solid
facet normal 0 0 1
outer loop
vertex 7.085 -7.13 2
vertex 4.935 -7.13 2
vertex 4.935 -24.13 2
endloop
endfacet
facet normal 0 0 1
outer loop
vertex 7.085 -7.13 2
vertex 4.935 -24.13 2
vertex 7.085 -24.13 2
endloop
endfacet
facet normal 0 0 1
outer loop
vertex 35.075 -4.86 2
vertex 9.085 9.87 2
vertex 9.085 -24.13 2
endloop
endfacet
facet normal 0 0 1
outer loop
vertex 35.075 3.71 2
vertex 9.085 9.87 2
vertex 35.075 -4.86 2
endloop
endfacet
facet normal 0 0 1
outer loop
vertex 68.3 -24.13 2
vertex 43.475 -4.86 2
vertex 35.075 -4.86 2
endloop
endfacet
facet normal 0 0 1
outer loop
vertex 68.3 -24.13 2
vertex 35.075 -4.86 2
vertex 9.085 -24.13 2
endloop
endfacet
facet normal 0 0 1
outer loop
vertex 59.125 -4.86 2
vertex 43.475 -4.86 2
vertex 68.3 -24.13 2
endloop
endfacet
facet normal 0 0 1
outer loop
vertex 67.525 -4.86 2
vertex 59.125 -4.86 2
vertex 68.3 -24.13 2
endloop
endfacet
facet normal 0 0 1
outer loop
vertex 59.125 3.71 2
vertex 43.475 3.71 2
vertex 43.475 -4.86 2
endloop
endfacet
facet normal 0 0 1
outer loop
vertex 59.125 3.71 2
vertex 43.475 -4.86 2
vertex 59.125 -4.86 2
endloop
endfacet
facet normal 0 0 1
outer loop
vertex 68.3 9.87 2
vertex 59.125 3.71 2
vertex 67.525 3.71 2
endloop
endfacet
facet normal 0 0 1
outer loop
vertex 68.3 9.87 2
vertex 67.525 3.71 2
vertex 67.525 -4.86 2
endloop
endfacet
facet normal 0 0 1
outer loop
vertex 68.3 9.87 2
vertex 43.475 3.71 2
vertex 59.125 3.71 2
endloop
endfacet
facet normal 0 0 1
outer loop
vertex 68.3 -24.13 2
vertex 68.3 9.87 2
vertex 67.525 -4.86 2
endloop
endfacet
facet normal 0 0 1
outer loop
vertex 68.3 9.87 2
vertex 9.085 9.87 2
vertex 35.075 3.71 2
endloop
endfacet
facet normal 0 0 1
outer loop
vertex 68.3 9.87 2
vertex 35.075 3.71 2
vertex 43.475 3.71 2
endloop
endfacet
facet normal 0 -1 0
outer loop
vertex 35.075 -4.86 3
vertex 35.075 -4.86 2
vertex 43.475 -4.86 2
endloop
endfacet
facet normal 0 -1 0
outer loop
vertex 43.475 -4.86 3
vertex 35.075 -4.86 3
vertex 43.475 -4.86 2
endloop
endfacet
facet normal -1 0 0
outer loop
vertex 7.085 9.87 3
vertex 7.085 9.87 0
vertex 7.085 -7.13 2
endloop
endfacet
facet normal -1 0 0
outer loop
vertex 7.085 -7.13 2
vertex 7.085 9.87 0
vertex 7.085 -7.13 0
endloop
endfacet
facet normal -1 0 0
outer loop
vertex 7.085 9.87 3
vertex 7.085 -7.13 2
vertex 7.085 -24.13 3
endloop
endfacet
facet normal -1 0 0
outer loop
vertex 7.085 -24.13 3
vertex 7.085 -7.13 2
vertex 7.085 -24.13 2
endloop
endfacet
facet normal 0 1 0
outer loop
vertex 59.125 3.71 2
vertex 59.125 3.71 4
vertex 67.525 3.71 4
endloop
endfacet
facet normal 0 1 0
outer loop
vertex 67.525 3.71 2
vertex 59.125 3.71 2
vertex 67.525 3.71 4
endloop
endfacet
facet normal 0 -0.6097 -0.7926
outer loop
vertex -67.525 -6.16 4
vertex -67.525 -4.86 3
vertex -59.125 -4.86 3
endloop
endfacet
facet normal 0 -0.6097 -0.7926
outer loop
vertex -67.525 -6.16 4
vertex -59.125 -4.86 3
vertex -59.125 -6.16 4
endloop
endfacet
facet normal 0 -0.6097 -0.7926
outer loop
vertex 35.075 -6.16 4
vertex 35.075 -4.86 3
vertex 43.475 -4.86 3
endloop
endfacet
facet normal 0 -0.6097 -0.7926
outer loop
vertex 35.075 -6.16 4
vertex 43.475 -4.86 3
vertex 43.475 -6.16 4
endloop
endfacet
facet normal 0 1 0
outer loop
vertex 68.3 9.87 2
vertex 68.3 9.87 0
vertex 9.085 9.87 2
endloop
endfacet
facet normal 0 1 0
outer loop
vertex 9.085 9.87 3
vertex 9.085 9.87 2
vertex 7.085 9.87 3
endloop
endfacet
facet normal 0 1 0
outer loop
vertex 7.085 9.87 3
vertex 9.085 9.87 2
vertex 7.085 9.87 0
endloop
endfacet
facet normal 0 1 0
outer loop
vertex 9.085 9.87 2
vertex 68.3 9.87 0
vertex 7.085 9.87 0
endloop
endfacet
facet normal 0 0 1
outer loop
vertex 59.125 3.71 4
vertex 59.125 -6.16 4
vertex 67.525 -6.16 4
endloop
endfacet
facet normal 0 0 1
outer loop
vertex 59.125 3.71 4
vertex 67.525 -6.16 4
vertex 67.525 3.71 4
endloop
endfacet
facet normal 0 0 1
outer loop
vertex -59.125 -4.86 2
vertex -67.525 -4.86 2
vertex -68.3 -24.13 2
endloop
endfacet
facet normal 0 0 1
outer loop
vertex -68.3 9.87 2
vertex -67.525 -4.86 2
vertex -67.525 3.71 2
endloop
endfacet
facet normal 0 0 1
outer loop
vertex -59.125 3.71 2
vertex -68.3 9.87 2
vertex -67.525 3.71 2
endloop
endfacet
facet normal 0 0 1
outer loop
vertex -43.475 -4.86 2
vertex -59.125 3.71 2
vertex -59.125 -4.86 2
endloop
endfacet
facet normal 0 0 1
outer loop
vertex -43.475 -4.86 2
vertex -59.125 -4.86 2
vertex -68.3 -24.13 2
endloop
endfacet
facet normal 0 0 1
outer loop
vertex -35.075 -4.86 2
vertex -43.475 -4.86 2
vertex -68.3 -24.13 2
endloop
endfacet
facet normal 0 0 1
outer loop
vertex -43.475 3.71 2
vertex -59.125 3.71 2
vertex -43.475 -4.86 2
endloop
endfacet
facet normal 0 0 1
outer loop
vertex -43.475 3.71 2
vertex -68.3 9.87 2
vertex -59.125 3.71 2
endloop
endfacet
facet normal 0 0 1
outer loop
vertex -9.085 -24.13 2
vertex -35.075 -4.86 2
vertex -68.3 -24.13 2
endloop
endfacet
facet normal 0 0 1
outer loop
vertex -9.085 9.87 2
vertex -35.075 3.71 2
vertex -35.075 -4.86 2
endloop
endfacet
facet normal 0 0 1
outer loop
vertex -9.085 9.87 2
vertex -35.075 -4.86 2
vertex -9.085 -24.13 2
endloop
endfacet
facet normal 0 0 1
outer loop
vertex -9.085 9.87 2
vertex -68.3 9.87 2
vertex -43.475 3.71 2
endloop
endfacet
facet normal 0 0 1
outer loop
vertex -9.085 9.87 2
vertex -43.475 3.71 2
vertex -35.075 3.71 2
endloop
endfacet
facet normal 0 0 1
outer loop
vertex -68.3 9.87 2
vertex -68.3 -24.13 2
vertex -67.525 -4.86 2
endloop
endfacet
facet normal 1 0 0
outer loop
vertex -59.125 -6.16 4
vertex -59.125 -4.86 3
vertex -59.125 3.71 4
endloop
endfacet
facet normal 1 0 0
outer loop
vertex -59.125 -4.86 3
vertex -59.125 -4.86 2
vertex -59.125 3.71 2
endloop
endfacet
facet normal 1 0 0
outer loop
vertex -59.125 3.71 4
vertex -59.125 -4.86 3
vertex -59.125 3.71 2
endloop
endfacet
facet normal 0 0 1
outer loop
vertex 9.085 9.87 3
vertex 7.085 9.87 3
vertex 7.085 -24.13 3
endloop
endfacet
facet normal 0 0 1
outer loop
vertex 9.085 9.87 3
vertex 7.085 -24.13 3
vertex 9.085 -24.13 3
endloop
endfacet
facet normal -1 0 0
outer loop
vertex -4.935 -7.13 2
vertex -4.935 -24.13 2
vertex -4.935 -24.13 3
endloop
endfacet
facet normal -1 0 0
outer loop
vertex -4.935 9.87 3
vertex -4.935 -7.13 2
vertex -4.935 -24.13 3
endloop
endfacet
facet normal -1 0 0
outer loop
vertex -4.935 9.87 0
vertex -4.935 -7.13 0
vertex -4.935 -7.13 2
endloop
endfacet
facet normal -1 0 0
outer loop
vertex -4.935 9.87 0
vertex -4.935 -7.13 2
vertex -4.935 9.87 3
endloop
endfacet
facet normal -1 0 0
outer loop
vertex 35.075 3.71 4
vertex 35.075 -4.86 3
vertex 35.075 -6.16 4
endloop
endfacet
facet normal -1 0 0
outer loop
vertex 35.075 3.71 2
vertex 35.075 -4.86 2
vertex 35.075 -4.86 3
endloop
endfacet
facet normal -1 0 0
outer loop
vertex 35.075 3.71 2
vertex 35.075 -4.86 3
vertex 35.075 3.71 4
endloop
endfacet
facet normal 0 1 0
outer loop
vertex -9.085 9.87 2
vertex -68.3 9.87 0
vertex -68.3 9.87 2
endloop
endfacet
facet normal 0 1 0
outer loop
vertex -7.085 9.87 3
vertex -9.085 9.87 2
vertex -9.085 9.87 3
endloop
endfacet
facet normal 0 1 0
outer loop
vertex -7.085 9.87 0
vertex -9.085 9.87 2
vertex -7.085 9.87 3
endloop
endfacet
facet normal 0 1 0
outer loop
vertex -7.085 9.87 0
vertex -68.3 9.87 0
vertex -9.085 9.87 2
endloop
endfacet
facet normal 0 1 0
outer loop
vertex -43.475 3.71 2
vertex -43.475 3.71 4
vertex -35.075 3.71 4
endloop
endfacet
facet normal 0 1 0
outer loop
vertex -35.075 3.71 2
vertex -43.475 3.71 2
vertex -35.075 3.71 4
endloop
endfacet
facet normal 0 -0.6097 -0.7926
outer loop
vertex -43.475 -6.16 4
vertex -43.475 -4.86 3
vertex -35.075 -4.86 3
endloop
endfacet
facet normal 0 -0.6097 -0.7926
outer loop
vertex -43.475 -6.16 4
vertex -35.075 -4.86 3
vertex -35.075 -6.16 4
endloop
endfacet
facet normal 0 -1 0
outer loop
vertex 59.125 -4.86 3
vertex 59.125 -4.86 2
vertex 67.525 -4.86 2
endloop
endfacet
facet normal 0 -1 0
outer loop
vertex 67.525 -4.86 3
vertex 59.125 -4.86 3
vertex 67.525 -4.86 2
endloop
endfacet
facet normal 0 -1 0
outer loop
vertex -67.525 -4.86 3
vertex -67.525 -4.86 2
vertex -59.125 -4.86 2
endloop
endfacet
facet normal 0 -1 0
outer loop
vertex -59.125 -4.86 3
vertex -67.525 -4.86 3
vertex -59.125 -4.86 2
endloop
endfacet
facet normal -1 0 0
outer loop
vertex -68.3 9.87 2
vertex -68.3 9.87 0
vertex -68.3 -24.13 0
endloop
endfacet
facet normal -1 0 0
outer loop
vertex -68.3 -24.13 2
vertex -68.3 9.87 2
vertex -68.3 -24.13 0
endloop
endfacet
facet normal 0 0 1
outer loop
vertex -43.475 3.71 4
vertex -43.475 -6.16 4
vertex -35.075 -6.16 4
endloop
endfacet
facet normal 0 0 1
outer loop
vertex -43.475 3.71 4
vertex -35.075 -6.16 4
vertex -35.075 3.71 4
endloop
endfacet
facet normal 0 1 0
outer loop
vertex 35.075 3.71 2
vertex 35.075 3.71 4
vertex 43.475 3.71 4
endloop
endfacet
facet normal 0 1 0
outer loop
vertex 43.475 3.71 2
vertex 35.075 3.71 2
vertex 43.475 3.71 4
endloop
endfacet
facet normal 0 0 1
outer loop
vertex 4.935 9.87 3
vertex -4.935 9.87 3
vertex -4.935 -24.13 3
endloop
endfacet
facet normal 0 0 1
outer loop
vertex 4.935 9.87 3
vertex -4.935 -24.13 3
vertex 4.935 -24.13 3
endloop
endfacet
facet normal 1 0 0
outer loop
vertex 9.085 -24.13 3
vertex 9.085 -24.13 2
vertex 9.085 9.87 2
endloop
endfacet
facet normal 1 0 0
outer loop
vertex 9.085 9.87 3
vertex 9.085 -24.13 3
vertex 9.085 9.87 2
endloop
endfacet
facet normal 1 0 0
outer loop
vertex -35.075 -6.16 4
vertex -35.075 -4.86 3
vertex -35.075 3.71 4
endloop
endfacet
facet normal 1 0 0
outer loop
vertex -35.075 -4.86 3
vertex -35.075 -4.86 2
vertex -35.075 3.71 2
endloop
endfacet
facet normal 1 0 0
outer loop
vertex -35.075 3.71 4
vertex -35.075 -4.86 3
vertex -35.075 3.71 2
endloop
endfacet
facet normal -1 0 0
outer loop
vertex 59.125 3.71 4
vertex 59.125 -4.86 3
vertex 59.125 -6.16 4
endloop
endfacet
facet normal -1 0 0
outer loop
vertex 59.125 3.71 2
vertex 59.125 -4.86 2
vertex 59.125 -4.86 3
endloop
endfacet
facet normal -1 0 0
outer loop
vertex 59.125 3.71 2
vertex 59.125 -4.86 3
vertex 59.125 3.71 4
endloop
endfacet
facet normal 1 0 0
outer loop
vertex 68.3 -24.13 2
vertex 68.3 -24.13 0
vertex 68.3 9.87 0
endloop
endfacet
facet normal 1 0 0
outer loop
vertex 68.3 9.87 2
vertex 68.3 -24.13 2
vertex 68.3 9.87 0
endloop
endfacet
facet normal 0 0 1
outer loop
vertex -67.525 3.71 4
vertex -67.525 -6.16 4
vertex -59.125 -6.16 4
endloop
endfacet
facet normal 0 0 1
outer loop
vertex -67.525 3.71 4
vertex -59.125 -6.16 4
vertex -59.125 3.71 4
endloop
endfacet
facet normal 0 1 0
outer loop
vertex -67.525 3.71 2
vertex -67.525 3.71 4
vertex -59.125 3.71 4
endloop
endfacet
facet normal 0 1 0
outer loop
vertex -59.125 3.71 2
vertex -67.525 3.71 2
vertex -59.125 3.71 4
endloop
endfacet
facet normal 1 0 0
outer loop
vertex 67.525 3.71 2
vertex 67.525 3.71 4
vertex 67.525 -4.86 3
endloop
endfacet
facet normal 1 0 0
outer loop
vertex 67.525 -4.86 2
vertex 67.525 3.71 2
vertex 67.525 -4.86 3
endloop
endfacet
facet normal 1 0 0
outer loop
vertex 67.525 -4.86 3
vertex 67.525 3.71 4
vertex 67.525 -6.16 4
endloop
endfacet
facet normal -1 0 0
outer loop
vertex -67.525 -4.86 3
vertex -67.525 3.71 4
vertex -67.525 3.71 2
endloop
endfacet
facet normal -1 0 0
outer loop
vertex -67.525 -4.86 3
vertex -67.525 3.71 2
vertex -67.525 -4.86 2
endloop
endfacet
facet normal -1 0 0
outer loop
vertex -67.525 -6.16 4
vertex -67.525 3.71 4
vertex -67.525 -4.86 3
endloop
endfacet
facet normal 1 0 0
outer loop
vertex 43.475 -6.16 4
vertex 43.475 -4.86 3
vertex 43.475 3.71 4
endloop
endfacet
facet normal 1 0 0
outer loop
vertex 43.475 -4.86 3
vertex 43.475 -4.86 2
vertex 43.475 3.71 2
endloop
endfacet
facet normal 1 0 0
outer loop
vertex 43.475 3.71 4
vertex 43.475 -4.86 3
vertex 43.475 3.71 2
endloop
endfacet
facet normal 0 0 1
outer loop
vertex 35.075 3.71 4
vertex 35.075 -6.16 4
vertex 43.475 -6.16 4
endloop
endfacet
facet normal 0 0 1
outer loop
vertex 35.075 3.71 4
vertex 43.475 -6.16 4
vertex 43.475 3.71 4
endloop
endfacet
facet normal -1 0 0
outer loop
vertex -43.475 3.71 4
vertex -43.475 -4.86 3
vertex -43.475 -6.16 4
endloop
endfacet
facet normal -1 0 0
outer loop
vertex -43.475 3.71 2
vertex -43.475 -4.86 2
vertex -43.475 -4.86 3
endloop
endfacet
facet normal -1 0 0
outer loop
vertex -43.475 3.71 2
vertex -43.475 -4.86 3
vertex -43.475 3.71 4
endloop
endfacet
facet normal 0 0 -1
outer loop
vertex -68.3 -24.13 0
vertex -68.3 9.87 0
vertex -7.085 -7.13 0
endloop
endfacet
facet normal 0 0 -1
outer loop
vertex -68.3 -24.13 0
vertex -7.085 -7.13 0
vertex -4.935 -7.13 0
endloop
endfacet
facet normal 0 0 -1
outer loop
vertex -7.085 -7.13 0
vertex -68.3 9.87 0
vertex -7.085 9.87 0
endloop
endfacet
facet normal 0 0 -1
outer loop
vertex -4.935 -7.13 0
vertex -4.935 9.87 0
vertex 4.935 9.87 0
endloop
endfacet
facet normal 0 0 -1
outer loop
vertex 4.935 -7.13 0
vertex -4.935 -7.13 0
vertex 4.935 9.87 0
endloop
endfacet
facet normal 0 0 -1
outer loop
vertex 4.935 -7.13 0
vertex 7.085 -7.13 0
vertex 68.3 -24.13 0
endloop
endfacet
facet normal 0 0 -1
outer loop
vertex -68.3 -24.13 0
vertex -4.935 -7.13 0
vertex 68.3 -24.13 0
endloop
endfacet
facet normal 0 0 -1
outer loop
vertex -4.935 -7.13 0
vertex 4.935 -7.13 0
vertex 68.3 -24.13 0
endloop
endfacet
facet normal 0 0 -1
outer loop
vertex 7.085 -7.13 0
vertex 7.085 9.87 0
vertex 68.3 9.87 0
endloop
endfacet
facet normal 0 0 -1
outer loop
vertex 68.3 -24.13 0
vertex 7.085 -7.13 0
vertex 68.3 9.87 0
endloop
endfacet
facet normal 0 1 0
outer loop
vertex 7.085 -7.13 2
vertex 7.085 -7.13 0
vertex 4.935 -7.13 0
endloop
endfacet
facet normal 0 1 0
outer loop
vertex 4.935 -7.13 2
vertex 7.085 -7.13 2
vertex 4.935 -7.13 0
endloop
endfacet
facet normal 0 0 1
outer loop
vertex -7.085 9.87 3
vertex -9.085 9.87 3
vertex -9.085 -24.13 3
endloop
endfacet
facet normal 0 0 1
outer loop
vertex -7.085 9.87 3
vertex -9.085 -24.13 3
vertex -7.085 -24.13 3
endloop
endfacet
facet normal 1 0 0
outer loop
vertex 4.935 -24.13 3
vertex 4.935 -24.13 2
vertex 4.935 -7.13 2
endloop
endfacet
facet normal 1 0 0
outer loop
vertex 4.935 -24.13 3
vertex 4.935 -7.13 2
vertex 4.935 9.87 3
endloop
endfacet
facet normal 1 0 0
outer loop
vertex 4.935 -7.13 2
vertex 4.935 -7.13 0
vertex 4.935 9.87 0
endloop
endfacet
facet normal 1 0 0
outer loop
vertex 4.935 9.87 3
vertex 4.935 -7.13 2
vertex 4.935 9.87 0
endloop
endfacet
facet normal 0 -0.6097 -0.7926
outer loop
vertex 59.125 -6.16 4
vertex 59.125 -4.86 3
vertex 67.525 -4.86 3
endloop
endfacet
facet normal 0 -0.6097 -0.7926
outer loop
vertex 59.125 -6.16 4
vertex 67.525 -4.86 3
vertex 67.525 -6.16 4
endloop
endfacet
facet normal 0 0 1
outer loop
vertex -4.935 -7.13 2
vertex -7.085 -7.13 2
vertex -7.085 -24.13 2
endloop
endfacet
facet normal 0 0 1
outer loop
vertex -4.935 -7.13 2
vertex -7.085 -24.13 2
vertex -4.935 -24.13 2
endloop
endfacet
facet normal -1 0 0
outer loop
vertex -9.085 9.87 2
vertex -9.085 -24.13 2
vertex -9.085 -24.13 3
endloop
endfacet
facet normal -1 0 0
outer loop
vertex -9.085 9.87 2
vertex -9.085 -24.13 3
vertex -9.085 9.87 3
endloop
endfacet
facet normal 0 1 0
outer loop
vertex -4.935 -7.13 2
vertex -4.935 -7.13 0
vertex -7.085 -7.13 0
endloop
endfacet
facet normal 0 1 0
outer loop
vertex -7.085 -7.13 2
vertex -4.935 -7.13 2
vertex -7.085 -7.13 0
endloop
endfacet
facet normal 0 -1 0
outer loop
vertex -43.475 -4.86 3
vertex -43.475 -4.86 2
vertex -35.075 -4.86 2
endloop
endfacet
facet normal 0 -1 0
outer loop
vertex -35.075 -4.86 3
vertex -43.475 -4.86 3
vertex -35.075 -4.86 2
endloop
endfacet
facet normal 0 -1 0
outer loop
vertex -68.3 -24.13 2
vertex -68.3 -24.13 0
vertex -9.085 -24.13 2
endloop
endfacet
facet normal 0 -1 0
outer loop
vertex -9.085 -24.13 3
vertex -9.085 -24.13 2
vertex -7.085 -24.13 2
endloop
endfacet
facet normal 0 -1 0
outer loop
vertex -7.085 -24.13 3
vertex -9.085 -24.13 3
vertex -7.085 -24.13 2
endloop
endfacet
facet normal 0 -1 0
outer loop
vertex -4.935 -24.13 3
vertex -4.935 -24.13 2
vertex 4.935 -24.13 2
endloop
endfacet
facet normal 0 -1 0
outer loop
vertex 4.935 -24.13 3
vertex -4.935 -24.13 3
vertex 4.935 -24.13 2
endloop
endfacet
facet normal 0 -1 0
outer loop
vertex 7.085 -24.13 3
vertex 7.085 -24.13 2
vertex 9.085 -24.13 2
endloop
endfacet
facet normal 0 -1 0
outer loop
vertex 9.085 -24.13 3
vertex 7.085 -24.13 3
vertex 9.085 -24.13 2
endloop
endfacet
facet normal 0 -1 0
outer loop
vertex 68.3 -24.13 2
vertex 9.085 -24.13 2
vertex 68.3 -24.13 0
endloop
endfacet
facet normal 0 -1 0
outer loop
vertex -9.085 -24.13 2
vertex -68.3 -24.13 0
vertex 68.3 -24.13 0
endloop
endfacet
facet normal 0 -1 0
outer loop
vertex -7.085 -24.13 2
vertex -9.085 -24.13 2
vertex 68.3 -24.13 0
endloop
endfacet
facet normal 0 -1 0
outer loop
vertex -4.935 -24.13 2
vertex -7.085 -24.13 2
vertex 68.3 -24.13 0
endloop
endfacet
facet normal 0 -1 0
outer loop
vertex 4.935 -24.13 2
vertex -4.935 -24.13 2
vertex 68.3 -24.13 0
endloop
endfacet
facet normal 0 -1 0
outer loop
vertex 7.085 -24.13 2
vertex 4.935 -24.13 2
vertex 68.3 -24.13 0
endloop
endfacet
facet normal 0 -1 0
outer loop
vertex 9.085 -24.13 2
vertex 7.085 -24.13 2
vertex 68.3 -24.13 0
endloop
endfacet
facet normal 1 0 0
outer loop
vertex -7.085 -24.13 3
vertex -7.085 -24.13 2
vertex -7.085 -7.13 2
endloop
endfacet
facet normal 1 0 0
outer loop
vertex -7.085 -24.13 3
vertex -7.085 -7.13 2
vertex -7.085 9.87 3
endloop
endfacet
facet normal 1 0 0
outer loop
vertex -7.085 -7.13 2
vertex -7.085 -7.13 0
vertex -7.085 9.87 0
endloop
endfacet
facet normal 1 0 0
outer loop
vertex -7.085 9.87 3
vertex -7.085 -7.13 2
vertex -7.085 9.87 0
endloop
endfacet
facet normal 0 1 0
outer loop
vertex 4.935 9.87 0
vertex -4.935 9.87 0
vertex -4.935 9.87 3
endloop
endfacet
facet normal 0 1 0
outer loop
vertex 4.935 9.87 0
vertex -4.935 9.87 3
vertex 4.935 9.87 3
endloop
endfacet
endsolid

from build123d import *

# Parameters (mm, degrees)
F2_DEPTH  = 2
F3_W      = 8.4
F3_H      = 9.72
F4_DEPTH  = 2
F6_DEPTH  = 135.05
F7_DEPTH  = 19.271
F8_W      = 9.87
F8_H      = 34
F8_W_2    = 2
F9_DEPTH  = 1
F10_W     = 8.4
F10_H     = 1.15
F11_DEPTH = 2


with BuildPart() as f2:
    # F1 (on Top) → F2 (new body)
    with BuildSketch(Plane.XY):
        Polygon((-7.085, 9.87), (-68.3, 9.87), (-68.3, -24.13), (68.3, -24.13), (68.3, 9.87), (7.085, 9.87), (7.085, -7.13), (4.935, -7.13), (4.935, 9.87), (-4.935, 9.87), (-4.935, -7.13), (-7.085, -7.13), align=None)
    extrude(amount=F2_DEPTH)

    # F3 (on face) → F4 (join)
    with BuildSketch(Plane.XY.offset(2)):
        with Locations((-63.325, 0)):
            Rectangle(F3_W, F3_H)
        with Locations((-39.275, 0)):
            Rectangle(F3_W, F3_H)
        with Locations((39.275, 0)):
            Rectangle(F3_W, F3_H)
        with Locations((63.325, 0)):
            Rectangle(F3_W, F3_H)
    extrude(amount=F4_DEPTH)

    # F5 (on face) → F6 (join, through all)
    with BuildSketch(Plane(origin=(-67.525, 0, 0), x_dir=(0, -1, 0), z_dir=(-1, 0, 0))):
        Polygon((6.16, 4), (4.86, 4), (4.86, 3), align=None)
    extrude(amount=-F6_DEPTH)

    # F7 (cut, through all): faces of the model
    f7_faces = [f2.faces().sort_by_distance(p)[0] for p in [
        (-51.3, -4.86, 3.5),
        (0, -4.86, 3.5),
        (51.3, -4.86, 3.5),
    ]]
    extrude(f7_faces, amount=-F7_DEPTH, mode=Mode.SUBTRACT)

    # F8 (on face) → F9 (join)
    with BuildSketch(Plane.XY.offset(2)):
        with Locations((0, -7.13)):
            Rectangle(F8_W, F8_H)
        with Locations((-8.085, -7.13)):
            Rectangle(F8_W_2, F8_H)
        with Locations((8.085, -7.13)):
            Rectangle(F8_W_2, F8_H)
    extrude(amount=F9_DEPTH)

    # F10 (on face) → F11 (cut, through all)
    with BuildSketch(Plane.XY.offset(4)):
        with Locations((-63.325, 4.285)):
            Rectangle(F10_W, F10_H)
        with Locations((-39.275, 4.285)):
            Rectangle(F10_W, F10_H)
        with Locations((63.325, 4.285)):
            Rectangle(F10_W, F10_H)
        with Locations((39.275, 4.285)):
            Rectangle(F10_W, F10_H)
    extrude(amount=-F11_DEPTH, mode=Mode.SUBTRACT)


solid = f2.part
